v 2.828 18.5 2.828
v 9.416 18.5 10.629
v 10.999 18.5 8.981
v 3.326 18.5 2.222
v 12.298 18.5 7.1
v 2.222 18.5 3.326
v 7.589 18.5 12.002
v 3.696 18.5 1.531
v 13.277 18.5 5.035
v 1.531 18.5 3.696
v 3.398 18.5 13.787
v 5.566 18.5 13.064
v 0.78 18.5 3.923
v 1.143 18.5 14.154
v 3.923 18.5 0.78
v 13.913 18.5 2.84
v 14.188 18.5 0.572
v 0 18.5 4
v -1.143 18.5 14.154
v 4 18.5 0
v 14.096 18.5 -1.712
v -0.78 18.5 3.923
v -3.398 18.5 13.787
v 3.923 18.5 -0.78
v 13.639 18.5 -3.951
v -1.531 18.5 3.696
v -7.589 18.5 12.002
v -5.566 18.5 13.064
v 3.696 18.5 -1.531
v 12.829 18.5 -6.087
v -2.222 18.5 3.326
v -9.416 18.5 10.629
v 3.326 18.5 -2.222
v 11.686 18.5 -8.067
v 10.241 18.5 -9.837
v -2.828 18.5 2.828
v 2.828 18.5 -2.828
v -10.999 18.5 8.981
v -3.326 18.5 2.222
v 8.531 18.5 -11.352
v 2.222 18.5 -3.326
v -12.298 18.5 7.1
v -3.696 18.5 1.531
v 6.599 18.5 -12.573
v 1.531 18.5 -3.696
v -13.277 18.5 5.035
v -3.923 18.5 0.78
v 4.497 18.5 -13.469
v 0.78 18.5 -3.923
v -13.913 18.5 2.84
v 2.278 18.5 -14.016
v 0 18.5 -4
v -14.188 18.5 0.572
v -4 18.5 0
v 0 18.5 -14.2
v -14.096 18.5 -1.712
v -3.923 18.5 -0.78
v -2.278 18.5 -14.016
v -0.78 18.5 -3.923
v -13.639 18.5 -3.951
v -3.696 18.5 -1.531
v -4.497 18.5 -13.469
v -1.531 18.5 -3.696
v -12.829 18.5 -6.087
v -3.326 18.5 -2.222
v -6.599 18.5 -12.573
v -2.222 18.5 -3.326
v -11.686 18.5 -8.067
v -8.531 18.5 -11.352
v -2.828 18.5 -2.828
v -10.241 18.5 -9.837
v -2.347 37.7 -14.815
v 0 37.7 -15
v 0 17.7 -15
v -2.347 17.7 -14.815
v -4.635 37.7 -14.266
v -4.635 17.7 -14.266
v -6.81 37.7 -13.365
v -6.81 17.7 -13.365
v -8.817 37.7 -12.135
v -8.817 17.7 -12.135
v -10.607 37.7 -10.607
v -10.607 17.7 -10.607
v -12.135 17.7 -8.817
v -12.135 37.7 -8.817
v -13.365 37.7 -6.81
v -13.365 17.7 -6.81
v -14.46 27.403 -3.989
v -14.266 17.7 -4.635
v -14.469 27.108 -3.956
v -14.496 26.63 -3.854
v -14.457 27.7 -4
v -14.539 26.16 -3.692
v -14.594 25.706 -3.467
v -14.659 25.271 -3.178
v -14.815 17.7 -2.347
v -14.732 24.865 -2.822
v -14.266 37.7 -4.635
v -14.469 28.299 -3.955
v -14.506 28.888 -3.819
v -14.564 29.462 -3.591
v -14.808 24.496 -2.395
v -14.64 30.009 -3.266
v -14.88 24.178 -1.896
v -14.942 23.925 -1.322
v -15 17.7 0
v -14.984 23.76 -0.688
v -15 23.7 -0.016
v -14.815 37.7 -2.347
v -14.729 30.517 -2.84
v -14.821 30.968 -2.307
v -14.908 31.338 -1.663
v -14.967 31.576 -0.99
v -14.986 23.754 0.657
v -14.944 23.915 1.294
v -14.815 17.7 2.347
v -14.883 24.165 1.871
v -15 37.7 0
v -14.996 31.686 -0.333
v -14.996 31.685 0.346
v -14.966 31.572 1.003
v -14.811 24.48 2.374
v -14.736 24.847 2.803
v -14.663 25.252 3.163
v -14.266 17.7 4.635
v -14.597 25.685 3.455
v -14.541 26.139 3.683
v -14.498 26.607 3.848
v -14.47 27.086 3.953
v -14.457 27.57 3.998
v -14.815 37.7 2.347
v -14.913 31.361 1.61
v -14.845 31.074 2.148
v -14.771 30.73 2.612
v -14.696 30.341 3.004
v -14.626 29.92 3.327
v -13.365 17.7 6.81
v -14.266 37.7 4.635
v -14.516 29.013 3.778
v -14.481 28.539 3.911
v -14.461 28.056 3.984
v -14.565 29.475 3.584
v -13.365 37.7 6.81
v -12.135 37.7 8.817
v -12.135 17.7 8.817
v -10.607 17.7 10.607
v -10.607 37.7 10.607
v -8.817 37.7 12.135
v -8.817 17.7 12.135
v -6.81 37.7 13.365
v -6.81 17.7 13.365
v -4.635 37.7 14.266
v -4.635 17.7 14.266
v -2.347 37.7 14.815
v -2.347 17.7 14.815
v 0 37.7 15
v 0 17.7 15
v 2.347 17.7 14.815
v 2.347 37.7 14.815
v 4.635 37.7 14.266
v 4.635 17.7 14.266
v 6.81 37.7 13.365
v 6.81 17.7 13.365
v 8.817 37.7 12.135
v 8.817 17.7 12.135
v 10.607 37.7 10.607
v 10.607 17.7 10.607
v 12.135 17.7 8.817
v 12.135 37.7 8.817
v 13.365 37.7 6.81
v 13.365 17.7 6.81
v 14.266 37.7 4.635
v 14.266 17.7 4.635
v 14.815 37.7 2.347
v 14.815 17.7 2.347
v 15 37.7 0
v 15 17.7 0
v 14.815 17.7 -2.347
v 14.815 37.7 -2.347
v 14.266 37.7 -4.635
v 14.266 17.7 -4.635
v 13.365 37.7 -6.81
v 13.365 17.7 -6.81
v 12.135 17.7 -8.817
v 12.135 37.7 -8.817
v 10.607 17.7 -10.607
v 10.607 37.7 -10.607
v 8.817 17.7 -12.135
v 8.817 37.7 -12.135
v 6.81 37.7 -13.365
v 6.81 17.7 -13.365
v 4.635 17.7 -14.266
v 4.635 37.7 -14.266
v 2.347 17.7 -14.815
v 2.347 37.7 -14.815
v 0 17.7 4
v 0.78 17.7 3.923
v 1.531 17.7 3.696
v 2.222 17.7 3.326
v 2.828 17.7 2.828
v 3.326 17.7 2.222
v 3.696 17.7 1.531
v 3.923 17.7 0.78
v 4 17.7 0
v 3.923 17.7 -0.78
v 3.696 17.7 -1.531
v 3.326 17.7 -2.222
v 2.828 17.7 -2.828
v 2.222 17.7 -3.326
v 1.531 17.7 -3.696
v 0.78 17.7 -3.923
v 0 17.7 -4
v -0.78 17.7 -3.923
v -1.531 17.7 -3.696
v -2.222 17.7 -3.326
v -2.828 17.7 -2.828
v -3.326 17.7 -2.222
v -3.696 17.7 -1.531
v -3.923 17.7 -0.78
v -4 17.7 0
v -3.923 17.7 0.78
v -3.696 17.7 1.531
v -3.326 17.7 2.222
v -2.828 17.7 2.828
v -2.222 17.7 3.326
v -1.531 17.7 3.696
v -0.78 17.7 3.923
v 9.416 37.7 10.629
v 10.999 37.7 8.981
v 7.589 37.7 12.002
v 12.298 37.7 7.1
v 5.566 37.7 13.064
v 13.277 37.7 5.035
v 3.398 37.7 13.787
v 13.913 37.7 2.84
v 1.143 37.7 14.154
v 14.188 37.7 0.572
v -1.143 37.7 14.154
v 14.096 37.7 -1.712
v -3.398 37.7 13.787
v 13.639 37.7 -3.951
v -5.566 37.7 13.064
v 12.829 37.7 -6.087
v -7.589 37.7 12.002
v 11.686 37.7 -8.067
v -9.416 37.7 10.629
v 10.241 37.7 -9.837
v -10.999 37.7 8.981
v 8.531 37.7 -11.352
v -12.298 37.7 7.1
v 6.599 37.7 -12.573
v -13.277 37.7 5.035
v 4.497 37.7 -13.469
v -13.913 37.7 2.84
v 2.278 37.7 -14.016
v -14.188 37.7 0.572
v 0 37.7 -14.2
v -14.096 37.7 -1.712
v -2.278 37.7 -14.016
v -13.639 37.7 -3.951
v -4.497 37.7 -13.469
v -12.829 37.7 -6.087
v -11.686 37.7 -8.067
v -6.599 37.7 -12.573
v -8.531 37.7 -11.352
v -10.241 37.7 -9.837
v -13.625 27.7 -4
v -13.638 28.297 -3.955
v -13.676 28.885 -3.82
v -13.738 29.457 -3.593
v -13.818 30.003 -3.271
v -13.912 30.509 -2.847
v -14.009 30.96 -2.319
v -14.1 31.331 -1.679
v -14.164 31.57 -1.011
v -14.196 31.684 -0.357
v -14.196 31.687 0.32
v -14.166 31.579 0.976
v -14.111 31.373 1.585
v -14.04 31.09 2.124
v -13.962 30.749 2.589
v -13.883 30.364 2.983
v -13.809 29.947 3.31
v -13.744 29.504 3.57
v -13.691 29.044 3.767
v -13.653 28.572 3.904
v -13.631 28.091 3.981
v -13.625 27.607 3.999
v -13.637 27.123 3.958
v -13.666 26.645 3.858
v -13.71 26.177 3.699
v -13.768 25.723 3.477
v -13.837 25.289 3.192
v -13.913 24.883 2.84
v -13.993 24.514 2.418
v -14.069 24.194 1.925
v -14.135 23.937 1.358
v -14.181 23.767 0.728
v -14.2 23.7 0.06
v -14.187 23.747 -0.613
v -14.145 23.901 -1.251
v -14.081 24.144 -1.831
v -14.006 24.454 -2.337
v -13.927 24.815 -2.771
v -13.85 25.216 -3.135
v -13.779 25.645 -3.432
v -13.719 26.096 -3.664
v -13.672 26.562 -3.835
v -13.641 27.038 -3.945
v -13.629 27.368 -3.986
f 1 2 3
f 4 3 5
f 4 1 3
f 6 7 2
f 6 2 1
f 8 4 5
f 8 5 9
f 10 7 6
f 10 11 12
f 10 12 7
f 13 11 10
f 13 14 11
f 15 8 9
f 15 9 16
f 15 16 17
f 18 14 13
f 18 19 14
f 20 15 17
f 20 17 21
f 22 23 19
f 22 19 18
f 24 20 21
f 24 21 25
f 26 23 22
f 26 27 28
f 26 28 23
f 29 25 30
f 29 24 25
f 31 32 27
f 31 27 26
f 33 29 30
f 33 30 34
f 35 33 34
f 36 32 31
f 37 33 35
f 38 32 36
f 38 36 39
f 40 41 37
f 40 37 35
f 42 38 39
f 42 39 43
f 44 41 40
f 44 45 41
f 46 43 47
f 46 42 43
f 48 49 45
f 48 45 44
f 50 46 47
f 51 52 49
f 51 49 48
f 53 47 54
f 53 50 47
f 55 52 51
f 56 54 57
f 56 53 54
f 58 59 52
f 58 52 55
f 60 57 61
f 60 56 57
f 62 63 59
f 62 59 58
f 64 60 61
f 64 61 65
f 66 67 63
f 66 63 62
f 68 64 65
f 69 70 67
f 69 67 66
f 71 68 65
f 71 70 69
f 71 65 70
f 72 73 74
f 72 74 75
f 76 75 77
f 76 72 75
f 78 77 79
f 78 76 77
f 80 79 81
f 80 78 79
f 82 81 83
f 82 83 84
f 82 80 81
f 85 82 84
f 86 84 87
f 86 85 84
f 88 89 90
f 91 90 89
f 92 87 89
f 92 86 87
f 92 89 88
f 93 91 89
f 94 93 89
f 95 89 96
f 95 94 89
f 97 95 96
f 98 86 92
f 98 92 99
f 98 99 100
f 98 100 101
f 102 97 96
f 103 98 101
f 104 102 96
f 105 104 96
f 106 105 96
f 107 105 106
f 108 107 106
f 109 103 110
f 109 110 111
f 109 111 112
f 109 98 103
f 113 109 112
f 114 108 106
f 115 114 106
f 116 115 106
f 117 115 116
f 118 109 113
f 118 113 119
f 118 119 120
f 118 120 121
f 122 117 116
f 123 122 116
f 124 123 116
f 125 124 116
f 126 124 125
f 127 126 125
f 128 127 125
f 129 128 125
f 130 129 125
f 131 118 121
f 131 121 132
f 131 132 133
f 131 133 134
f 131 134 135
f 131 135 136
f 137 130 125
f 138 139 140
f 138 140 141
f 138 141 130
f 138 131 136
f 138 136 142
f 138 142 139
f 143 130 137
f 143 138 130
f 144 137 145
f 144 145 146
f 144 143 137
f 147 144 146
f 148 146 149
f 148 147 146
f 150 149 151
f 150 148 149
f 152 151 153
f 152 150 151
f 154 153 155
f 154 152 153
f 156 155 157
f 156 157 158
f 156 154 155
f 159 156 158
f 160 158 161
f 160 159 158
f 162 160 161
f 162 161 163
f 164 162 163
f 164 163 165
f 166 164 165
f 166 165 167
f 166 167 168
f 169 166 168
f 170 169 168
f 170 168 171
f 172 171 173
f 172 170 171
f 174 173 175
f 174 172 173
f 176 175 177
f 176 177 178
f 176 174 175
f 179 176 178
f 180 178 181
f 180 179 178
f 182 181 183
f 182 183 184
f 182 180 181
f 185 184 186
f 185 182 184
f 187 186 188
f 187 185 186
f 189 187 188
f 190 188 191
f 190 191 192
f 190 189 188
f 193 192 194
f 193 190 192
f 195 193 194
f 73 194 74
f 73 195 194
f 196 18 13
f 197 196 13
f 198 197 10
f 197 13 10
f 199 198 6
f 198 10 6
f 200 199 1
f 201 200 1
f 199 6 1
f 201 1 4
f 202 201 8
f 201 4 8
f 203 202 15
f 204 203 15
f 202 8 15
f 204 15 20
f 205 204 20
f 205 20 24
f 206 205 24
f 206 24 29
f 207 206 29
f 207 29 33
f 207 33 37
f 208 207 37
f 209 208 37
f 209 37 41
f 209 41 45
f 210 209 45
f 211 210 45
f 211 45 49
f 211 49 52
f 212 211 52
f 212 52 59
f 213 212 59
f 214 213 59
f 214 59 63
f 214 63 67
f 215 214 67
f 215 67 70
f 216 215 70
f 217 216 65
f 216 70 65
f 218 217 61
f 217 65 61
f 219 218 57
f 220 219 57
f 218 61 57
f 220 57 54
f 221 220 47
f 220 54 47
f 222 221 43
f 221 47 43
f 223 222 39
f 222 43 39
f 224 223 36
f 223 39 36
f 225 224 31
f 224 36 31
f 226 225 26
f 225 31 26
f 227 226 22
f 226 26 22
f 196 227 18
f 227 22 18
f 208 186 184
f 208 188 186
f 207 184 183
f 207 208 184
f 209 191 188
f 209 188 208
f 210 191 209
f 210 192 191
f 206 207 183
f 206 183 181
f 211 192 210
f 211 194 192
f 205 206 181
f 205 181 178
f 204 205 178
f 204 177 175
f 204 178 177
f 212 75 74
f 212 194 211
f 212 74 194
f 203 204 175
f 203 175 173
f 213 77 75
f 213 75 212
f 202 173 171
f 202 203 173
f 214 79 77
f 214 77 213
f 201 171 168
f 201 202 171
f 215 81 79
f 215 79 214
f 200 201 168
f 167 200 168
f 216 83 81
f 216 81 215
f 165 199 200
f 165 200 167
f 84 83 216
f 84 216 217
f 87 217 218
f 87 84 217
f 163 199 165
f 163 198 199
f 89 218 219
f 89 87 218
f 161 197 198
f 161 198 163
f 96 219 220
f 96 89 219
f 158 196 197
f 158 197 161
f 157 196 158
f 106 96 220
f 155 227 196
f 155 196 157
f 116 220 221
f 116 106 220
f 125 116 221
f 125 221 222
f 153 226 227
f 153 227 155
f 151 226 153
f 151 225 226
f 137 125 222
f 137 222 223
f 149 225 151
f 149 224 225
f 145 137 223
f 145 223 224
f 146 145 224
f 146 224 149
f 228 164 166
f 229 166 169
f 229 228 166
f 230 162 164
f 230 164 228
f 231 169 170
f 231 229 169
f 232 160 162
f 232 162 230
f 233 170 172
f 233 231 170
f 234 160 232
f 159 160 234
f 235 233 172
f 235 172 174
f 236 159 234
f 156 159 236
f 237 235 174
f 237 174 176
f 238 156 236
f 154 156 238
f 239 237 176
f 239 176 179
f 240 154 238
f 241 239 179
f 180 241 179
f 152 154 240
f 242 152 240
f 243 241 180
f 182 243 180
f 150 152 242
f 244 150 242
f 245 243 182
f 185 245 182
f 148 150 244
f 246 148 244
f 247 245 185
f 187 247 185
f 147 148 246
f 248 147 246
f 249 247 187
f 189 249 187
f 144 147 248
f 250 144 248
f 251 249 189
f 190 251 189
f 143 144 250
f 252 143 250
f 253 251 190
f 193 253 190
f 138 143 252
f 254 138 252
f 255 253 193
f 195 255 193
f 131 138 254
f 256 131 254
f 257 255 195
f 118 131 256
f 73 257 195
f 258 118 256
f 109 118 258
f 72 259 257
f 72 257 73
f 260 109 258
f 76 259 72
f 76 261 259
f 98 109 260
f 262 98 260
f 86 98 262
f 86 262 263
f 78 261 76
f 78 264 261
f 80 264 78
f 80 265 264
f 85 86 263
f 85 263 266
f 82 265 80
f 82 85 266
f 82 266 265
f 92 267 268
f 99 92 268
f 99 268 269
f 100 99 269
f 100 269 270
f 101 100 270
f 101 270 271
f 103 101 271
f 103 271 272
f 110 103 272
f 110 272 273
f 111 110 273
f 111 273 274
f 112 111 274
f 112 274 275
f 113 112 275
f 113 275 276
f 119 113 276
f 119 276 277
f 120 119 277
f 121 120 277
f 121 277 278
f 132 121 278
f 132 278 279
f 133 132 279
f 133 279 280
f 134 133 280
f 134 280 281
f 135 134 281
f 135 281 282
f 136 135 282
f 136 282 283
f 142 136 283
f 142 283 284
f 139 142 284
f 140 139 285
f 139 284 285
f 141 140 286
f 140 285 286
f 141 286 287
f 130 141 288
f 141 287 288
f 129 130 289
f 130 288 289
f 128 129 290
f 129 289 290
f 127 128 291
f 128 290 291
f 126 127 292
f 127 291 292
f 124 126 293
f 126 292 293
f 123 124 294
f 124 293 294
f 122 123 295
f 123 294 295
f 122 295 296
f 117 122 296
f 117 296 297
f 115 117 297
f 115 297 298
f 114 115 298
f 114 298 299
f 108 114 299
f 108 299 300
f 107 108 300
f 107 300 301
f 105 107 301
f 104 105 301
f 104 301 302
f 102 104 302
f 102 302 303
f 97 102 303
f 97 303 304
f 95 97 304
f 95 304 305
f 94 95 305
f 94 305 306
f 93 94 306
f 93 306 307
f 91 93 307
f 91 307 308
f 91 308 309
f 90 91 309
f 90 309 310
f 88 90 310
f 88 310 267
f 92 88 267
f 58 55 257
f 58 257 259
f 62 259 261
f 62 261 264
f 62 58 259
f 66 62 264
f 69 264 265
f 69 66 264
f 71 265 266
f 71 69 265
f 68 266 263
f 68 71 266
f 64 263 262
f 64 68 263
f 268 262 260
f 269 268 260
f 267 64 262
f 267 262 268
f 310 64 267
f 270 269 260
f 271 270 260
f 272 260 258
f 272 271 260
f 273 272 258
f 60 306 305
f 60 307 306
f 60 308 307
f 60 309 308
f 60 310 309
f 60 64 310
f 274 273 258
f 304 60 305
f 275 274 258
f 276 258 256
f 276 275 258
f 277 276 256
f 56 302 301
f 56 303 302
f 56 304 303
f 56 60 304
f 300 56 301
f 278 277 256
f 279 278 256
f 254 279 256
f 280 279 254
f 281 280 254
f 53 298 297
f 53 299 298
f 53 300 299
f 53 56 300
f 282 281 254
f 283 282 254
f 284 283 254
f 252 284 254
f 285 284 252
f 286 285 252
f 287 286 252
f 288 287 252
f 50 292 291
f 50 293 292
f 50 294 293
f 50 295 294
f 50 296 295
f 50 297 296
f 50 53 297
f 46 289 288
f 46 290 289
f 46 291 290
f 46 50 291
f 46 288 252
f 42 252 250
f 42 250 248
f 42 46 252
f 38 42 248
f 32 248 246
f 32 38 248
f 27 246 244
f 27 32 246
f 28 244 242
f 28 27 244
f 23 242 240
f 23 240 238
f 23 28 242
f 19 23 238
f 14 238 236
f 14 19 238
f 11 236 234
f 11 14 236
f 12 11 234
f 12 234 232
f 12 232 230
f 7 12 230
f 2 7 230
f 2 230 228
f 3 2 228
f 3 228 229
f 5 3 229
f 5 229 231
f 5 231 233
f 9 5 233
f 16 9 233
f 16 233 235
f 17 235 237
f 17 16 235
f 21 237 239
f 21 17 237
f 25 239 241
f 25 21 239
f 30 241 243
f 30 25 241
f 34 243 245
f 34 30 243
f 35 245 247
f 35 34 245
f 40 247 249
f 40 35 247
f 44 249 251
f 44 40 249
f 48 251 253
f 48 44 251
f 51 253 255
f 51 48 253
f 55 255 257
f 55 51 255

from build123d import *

# Parameters (mm, degrees)
SKETCH2_R          = 4
CUT_EXTRUDE1_DEPTH = 10
SKETCH3_R          = 4
CUT_EXTRUDE2_DEPTH = 18


with BuildPart() as part:
    # Sketch1 → Revolve1 (revolve)
    with BuildSketch(Plane.XY, mode=Mode.PRIVATE) as revolve1_sk:
        Polygon((-15, 17.7), (-15, 37.7), (-14.2, 37.7), (-14.2, 18.5), (0, 18.5), (0, 17.7), align=None)
    revolve(revolve1_sk.sketch.rotate(Axis((0, 0, 0), (0, 1, 0)), 270), axis=Axis((0, 0, 0), (0, 1, 0)))

    # Sketch2 → Cut-Extrude1 (cut)
    with BuildSketch(Plane(origin=(0, 18.5, 0), x_dir=(1, 0, 0), z_dir=(0, 1, 0))):
        with Locations(Location((0, 0, 0), (0, 0, 270))):
            Circle(SKETCH2_R)
    extrude(amount=-CUT_EXTRUDE1_DEPTH, mode=Mode.SUBTRACT)

    # Sketch3 → Cut-Extrude2 (cut)
    with BuildSketch(Plane(origin=(0, 0, 0), x_dir=(0, 0, -1), z_dir=(1, 0, 0))):
        with Locations((0, 27.7)):
            Circle(SKETCH3_R)
    extrude(amount=-CUT_EXTRUDE2_DEPTH, mode=Mode.SUBTRACT)


solid = part.part
